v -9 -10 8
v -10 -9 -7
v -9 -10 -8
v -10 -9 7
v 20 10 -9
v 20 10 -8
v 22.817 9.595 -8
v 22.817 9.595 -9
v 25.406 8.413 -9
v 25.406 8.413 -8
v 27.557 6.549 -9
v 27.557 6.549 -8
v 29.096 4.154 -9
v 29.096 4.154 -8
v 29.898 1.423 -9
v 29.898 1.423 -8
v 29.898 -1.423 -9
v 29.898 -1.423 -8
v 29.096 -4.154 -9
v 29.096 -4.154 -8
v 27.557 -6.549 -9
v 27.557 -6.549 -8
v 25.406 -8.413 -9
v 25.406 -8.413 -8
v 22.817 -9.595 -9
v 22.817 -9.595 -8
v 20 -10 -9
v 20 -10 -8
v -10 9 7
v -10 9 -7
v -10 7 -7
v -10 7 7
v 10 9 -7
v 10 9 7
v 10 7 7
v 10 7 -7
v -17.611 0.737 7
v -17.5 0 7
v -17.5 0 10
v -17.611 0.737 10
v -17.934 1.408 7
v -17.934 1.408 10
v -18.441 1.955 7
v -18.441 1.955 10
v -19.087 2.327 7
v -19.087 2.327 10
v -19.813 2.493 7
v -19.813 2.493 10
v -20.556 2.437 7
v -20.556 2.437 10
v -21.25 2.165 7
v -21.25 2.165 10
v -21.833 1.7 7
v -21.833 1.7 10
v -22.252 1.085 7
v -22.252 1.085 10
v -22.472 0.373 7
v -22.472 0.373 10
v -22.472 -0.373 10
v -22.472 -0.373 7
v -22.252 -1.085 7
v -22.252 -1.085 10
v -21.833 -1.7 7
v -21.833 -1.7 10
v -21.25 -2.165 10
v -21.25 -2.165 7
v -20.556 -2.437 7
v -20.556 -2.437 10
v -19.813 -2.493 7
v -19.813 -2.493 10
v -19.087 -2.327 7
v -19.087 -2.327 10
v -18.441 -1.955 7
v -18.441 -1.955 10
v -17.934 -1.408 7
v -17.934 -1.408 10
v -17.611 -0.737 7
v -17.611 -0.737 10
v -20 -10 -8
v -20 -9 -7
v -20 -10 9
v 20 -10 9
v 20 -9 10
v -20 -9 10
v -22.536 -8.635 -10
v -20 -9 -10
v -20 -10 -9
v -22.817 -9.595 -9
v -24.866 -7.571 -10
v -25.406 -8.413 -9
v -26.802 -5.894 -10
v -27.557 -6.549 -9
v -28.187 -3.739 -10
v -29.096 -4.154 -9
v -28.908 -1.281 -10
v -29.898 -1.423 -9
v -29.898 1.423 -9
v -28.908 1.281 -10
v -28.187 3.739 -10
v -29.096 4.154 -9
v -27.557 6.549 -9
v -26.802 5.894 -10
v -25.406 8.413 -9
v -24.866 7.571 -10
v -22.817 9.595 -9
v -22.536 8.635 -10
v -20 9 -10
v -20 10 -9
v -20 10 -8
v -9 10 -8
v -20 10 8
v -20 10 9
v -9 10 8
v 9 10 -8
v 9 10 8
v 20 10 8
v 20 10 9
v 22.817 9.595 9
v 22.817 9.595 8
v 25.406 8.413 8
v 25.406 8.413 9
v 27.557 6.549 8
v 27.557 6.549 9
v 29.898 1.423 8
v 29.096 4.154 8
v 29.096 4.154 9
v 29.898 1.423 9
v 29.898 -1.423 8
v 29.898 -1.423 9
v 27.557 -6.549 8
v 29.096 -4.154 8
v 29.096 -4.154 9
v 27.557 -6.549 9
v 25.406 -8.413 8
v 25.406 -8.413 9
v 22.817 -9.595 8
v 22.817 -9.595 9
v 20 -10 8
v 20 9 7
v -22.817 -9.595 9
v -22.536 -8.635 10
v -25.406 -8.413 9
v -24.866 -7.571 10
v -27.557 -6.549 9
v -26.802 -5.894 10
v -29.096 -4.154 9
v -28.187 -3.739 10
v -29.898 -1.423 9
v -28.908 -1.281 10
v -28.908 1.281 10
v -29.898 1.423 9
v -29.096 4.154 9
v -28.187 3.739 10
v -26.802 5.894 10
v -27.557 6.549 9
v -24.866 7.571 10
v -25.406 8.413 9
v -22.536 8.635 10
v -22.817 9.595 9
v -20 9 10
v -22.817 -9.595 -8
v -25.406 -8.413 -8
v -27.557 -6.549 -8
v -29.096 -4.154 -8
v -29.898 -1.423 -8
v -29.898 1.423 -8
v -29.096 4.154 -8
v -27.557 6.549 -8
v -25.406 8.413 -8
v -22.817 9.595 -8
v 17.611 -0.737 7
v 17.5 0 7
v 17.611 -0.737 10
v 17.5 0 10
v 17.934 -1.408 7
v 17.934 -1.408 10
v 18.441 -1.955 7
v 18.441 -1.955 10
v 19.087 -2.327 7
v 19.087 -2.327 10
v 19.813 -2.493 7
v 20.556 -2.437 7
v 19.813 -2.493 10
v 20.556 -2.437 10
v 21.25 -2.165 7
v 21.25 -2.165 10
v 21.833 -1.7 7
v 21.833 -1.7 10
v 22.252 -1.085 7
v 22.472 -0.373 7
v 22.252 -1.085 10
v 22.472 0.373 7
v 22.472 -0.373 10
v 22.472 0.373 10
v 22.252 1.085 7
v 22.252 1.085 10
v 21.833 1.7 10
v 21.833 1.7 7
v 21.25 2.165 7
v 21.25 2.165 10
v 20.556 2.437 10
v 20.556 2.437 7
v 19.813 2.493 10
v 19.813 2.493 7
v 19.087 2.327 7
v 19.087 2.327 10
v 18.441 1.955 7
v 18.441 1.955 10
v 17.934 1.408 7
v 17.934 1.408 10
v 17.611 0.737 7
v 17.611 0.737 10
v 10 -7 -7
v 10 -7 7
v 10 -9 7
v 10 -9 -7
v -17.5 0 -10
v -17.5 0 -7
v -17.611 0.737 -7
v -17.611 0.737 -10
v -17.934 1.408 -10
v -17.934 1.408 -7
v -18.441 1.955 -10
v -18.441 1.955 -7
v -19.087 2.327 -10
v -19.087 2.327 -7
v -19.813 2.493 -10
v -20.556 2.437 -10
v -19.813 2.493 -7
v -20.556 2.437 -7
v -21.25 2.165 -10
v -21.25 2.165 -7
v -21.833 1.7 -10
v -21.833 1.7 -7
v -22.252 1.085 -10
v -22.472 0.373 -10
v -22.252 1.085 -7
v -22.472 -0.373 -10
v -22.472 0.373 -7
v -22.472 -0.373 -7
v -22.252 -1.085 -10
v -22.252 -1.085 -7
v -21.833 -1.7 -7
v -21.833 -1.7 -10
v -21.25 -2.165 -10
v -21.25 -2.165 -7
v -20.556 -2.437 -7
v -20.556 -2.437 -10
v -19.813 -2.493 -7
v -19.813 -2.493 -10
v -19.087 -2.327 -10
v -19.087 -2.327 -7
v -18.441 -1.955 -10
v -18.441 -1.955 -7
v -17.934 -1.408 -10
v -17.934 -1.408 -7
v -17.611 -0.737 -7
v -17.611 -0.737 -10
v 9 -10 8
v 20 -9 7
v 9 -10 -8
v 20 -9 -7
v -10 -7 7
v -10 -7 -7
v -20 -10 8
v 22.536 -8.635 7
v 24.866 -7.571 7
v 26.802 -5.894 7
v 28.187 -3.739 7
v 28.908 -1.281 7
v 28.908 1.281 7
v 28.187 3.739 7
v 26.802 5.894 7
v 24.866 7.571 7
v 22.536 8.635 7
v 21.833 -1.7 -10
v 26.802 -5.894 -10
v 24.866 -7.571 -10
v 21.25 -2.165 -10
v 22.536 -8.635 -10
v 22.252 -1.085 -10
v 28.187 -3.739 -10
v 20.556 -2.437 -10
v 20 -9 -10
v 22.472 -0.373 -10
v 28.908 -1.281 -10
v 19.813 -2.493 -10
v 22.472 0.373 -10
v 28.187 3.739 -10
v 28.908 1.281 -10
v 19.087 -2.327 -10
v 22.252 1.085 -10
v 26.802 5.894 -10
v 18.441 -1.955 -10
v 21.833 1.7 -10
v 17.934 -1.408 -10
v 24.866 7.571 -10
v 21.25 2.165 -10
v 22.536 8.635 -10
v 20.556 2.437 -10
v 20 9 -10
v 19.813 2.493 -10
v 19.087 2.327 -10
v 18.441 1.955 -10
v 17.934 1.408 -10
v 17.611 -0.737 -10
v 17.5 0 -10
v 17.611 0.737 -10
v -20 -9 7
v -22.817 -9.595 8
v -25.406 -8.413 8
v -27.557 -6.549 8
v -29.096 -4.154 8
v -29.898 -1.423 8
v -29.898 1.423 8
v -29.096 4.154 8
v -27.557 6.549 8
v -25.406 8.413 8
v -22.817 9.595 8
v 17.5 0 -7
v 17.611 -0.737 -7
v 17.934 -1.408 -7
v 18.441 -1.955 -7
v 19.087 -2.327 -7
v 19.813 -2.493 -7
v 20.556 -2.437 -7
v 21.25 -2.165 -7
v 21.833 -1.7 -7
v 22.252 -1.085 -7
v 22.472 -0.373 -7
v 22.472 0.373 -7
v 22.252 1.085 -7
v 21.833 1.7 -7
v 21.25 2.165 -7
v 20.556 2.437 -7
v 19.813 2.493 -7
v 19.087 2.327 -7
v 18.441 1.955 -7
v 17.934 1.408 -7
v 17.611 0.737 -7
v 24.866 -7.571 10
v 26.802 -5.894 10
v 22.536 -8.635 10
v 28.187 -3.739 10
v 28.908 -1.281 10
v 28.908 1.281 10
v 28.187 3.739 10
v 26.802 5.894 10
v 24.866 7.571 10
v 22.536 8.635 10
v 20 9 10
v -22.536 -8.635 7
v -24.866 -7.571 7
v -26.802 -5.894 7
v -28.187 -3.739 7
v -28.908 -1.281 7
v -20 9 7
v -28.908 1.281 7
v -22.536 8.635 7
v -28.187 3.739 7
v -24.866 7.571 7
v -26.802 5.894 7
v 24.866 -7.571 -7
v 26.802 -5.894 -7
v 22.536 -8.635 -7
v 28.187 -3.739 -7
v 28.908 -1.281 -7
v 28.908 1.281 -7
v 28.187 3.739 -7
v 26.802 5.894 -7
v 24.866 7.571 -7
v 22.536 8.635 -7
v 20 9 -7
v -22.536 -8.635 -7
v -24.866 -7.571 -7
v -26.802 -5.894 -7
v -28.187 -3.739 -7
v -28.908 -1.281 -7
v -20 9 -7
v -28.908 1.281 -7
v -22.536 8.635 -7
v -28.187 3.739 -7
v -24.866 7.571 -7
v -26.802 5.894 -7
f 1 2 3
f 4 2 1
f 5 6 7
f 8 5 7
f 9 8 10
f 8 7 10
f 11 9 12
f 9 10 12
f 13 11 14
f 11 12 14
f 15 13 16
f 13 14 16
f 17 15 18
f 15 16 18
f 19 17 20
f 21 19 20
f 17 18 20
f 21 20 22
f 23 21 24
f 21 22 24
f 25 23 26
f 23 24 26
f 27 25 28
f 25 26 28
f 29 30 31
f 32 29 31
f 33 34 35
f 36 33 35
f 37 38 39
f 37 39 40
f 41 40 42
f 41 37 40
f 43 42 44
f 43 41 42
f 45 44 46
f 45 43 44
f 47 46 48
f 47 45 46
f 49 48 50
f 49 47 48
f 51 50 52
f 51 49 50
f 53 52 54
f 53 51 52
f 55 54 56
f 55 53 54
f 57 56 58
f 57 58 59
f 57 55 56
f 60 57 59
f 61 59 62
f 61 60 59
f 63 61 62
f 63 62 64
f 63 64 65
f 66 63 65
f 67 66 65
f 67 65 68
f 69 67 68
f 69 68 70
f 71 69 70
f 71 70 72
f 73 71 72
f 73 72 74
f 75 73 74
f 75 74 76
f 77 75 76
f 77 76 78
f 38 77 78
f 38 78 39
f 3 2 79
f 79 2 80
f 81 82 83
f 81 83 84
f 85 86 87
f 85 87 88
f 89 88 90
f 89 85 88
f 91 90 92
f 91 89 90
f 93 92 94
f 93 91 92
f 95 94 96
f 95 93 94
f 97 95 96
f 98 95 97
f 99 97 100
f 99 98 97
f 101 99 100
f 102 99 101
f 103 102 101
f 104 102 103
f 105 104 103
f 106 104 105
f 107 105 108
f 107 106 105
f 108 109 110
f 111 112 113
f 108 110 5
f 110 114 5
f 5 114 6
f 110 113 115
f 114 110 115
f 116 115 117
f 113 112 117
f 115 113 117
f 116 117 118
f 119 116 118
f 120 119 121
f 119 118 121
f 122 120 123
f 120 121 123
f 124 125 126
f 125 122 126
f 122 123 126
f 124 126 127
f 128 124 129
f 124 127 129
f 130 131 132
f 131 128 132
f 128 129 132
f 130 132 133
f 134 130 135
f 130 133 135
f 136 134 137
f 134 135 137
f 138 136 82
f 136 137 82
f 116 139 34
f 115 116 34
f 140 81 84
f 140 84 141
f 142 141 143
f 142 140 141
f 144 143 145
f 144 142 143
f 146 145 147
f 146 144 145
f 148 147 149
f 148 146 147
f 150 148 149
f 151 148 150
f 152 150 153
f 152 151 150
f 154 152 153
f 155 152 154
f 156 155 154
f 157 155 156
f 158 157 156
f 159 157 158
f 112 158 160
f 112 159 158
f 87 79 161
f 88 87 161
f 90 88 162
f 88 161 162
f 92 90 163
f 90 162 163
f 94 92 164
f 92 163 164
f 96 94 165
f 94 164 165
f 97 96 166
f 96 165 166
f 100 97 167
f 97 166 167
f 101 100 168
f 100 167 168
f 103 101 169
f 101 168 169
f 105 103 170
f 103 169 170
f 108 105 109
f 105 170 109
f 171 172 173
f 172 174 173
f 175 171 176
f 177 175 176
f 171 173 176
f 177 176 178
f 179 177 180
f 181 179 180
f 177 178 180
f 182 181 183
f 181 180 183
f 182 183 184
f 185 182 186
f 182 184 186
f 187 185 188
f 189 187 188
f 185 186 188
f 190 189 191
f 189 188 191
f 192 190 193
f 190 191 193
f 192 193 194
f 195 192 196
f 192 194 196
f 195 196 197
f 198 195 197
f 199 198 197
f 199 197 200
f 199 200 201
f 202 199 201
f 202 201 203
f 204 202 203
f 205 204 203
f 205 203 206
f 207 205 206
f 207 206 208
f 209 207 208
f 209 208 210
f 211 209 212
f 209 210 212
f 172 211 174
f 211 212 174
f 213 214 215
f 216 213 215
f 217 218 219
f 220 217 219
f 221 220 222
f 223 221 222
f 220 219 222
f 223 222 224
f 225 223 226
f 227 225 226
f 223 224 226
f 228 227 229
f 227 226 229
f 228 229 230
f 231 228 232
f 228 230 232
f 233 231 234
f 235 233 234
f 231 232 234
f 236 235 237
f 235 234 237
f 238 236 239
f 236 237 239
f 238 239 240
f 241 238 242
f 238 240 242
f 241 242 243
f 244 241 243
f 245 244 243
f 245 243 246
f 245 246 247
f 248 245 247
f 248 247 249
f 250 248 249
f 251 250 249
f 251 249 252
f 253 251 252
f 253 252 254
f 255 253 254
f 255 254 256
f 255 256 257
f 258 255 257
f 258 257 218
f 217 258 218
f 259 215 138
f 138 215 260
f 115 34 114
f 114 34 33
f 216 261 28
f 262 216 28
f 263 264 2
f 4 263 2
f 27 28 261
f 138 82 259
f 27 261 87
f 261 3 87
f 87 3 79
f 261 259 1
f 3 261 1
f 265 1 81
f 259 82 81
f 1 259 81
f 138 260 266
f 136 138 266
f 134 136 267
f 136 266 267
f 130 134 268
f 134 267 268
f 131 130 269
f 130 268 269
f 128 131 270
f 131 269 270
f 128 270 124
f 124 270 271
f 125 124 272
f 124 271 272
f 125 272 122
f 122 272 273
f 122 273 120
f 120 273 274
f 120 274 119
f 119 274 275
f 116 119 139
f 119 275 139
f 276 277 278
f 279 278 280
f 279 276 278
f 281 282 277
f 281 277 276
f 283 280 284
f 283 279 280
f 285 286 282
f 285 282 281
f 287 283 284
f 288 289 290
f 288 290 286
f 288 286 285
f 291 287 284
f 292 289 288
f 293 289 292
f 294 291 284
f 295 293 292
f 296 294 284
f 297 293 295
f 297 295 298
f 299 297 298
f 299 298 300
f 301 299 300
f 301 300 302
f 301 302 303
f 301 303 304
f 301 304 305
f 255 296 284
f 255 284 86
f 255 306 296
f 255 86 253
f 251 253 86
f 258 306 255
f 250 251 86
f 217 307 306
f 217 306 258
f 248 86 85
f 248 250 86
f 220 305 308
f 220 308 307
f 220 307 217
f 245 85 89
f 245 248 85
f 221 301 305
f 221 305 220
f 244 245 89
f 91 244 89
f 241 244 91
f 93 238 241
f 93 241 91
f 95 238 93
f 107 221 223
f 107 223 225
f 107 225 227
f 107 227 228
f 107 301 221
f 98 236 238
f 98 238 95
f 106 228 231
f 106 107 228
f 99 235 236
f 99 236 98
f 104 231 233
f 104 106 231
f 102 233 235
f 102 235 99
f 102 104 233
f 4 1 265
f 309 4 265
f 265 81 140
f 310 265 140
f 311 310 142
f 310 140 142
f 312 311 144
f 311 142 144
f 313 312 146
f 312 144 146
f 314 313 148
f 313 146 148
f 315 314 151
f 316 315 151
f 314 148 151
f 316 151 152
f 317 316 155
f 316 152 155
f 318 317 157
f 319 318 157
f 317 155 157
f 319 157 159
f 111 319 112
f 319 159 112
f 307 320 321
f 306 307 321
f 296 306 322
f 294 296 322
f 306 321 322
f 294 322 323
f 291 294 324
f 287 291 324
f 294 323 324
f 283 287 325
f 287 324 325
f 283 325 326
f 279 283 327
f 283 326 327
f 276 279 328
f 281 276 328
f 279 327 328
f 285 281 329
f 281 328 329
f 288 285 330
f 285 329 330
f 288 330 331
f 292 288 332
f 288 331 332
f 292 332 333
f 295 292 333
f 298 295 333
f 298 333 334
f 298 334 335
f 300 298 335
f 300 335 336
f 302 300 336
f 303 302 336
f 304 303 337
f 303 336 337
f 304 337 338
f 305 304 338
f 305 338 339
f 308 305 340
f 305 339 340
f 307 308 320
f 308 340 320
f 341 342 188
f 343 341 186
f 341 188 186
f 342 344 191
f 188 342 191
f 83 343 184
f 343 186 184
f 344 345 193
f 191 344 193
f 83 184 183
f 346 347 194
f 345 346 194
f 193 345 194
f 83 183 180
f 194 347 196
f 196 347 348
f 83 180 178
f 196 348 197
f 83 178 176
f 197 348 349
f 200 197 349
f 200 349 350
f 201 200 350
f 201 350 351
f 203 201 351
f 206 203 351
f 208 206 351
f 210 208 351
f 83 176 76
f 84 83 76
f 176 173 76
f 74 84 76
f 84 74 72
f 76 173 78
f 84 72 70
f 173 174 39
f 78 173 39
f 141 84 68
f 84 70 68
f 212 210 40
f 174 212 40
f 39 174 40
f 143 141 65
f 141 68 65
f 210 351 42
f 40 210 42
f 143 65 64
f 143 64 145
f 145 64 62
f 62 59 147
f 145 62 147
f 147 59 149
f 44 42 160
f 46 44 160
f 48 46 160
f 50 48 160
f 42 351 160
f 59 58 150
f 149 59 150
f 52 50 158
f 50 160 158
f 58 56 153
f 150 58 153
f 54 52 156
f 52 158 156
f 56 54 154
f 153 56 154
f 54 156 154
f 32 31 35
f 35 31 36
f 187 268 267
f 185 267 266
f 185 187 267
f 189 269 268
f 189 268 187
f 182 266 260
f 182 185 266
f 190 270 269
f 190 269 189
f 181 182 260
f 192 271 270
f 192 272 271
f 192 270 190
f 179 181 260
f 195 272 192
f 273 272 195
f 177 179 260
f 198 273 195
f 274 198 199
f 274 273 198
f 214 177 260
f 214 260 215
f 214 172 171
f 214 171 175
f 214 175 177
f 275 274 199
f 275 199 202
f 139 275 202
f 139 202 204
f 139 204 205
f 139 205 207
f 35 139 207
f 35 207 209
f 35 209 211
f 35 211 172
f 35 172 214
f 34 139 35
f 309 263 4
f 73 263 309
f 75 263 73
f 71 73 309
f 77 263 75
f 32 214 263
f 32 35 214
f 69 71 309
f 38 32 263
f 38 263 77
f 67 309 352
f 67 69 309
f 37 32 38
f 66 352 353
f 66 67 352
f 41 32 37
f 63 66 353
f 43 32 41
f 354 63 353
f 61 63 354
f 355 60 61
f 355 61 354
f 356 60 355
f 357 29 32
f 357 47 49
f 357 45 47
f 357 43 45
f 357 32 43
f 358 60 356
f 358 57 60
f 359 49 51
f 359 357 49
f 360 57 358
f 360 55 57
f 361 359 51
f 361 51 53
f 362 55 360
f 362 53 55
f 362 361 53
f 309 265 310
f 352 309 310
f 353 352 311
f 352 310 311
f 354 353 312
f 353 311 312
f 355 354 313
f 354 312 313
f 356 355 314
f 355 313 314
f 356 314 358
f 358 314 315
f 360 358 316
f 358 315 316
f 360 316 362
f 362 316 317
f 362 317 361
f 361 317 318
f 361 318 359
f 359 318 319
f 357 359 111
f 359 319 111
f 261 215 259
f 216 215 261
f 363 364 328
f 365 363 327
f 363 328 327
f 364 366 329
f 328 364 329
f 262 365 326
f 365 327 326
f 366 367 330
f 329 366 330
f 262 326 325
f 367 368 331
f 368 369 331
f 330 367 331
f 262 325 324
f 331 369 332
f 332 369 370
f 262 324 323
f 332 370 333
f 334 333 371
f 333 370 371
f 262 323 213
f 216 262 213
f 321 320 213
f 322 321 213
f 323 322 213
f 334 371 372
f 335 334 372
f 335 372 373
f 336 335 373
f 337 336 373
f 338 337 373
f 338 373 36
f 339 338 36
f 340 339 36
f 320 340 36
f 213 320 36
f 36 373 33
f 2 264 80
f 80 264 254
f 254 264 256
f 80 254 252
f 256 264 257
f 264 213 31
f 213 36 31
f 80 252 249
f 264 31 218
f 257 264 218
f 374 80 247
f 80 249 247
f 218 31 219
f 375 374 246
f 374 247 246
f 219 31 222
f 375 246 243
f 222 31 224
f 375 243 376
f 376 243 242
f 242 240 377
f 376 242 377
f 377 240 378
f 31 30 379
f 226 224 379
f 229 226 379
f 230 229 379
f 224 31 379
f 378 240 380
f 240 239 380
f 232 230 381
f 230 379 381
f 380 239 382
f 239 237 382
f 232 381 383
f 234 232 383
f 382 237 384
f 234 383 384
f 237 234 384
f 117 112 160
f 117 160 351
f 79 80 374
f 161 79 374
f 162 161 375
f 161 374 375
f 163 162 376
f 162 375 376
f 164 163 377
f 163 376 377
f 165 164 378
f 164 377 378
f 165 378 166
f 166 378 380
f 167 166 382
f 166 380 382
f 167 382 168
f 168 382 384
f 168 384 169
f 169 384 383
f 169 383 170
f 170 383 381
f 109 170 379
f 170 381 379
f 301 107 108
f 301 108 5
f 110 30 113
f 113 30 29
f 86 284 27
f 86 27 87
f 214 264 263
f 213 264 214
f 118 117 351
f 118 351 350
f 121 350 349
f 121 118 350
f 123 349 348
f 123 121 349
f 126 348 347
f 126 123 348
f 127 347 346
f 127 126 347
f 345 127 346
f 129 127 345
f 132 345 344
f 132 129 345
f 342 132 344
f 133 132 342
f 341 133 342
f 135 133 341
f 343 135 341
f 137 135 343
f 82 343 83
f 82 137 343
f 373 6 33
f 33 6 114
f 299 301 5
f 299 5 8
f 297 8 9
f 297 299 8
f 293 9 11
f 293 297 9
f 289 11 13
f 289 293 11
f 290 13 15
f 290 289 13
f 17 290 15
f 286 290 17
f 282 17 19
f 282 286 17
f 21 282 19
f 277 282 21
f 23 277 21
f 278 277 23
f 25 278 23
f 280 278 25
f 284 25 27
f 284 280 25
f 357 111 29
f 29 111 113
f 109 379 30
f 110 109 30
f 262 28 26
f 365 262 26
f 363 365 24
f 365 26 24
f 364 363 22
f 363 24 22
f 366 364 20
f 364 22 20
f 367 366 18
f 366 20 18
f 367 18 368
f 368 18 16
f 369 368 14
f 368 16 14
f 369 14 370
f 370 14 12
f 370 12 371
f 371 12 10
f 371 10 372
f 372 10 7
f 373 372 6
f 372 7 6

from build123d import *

# Parameters (mm, degrees)
BOSS_EXTRUDE1_DEPTH = 10
CUT_EXTRUDE1_DEPTH  = 7
SKETCH3_R           = 2.5
CUT_EXTRUDE2_DEPTH  = 10
CHAMFER2_SIZE       = 1
CHAMFER3_SIZE       = 1
SHELL1_START        = -7
SHELL1_OUTLINE_W    = 20
SHELL1_OUTLINE_H    = 14
SHELL1_DEPTH        = 14
CHAMFER4_SIZE       = 1


# Read off the part's stored shape, not the designer's step: Shell1
with BuildPart() as part:
    # Sketch1 → Boss-Extrude1 (new, symmetric)
    with BuildSketch(Plane.XY):
        with BuildLine():
            Line((-20, 10), (20, 10))
            ThreePointArc((20, 10), (30, 0), (20, -10))
            Line((20, -10), (-20, -10))
            ThreePointArc((-20, -10), (-30, 0), (-20, 10))
        make_face()
    extrude(amount=BOSS_EXTRUDE1_DEPTH, both=True)

    # Sketch2 → Cut-Extrude1 (cut, symmetric)
    with BuildSketch(Plane.XY):
        with BuildLine():
            Line((-20, 10), (-10, 10))
            Line((-10, 10), (-10, -10))
            Line((-10, -10), (-20, -10))
            ThreePointArc((-20, -10), (-30, 0), (-20, 10))
        make_face()
        with BuildLine():
            Line((10, -10), (20, -10))
            ThreePointArc((20, -10), (30, 0), (20, 10))
            Line((20, 10), (10, 10))
            Line((10, 10), (10, -10))
        make_face()
    extrude(amount=CUT_EXTRUDE1_DEPTH, both=True, mode=Mode.SUBTRACT)

    # Sketch3 → Cut-Extrude2 (cut, symmetric)
    with BuildSketch(Plane.XY):
        with Locations((-20, 0)):
            Circle(SKETCH3_R)
        with Locations(Location((20, 0, 0), (0, 0, 180))):
            Circle(SKETCH3_R)
    extrude(amount=CUT_EXTRUDE2_DEPTH, both=True, mode=Mode.SUBTRACT)

    # Chamfer2
    chamfer2_edges = [part.edges().sort_by_distance(p)[0] for p in [
        (-30, 0, -7),
        (-15, 10, -7),
        (-15, -10, -7),
        (-30, 0, 7),
        (-15, -10, 7),
        (-15, 10, 7),
        (30, 0, -7),
        (15, -10, -7),
        (15, 10, -7),
        (30, 0, 7),
        (15, 10, 7),
        (15, -10, 7),
    ]]
    chamfer(chamfer2_edges, length=CHAMFER2_SIZE)

    # Chamfer3
    chamfer3_edges = [part.edges().sort_by_distance(p)[0] for p in [
        (30, 0, 10),
        (0, 10, 10),
        (-30, 0, 10),
        (0, 10, -10),
        (30, 0, -10),
        (0, -10, -10),
        (-30, 0, -10),
        (0, -10, 10),
    ]]
    chamfer(chamfer3_edges, length=CHAMFER3_SIZE)

    # Shell1 outline → Shell1 (cut)
    with BuildSketch(Plane.XY.offset(SHELL1_START)):
        Rectangle(SHELL1_OUTLINE_W, SHELL1_OUTLINE_H)
    extrude(amount=SHELL1_DEPTH, mode=Mode.SUBTRACT)

    # Chamfer4
    chamfer4_edges = [part.edges().sort_by_distance(p)[0] for p in [
        (10, -10, 0),
        (10, 10, 0),
        (-10, -10, 0),
        (-10, 10, 0),
    ]]
    chamfer(chamfer4_edges, length=CHAMFER4_SIZE)


solid = part.part
